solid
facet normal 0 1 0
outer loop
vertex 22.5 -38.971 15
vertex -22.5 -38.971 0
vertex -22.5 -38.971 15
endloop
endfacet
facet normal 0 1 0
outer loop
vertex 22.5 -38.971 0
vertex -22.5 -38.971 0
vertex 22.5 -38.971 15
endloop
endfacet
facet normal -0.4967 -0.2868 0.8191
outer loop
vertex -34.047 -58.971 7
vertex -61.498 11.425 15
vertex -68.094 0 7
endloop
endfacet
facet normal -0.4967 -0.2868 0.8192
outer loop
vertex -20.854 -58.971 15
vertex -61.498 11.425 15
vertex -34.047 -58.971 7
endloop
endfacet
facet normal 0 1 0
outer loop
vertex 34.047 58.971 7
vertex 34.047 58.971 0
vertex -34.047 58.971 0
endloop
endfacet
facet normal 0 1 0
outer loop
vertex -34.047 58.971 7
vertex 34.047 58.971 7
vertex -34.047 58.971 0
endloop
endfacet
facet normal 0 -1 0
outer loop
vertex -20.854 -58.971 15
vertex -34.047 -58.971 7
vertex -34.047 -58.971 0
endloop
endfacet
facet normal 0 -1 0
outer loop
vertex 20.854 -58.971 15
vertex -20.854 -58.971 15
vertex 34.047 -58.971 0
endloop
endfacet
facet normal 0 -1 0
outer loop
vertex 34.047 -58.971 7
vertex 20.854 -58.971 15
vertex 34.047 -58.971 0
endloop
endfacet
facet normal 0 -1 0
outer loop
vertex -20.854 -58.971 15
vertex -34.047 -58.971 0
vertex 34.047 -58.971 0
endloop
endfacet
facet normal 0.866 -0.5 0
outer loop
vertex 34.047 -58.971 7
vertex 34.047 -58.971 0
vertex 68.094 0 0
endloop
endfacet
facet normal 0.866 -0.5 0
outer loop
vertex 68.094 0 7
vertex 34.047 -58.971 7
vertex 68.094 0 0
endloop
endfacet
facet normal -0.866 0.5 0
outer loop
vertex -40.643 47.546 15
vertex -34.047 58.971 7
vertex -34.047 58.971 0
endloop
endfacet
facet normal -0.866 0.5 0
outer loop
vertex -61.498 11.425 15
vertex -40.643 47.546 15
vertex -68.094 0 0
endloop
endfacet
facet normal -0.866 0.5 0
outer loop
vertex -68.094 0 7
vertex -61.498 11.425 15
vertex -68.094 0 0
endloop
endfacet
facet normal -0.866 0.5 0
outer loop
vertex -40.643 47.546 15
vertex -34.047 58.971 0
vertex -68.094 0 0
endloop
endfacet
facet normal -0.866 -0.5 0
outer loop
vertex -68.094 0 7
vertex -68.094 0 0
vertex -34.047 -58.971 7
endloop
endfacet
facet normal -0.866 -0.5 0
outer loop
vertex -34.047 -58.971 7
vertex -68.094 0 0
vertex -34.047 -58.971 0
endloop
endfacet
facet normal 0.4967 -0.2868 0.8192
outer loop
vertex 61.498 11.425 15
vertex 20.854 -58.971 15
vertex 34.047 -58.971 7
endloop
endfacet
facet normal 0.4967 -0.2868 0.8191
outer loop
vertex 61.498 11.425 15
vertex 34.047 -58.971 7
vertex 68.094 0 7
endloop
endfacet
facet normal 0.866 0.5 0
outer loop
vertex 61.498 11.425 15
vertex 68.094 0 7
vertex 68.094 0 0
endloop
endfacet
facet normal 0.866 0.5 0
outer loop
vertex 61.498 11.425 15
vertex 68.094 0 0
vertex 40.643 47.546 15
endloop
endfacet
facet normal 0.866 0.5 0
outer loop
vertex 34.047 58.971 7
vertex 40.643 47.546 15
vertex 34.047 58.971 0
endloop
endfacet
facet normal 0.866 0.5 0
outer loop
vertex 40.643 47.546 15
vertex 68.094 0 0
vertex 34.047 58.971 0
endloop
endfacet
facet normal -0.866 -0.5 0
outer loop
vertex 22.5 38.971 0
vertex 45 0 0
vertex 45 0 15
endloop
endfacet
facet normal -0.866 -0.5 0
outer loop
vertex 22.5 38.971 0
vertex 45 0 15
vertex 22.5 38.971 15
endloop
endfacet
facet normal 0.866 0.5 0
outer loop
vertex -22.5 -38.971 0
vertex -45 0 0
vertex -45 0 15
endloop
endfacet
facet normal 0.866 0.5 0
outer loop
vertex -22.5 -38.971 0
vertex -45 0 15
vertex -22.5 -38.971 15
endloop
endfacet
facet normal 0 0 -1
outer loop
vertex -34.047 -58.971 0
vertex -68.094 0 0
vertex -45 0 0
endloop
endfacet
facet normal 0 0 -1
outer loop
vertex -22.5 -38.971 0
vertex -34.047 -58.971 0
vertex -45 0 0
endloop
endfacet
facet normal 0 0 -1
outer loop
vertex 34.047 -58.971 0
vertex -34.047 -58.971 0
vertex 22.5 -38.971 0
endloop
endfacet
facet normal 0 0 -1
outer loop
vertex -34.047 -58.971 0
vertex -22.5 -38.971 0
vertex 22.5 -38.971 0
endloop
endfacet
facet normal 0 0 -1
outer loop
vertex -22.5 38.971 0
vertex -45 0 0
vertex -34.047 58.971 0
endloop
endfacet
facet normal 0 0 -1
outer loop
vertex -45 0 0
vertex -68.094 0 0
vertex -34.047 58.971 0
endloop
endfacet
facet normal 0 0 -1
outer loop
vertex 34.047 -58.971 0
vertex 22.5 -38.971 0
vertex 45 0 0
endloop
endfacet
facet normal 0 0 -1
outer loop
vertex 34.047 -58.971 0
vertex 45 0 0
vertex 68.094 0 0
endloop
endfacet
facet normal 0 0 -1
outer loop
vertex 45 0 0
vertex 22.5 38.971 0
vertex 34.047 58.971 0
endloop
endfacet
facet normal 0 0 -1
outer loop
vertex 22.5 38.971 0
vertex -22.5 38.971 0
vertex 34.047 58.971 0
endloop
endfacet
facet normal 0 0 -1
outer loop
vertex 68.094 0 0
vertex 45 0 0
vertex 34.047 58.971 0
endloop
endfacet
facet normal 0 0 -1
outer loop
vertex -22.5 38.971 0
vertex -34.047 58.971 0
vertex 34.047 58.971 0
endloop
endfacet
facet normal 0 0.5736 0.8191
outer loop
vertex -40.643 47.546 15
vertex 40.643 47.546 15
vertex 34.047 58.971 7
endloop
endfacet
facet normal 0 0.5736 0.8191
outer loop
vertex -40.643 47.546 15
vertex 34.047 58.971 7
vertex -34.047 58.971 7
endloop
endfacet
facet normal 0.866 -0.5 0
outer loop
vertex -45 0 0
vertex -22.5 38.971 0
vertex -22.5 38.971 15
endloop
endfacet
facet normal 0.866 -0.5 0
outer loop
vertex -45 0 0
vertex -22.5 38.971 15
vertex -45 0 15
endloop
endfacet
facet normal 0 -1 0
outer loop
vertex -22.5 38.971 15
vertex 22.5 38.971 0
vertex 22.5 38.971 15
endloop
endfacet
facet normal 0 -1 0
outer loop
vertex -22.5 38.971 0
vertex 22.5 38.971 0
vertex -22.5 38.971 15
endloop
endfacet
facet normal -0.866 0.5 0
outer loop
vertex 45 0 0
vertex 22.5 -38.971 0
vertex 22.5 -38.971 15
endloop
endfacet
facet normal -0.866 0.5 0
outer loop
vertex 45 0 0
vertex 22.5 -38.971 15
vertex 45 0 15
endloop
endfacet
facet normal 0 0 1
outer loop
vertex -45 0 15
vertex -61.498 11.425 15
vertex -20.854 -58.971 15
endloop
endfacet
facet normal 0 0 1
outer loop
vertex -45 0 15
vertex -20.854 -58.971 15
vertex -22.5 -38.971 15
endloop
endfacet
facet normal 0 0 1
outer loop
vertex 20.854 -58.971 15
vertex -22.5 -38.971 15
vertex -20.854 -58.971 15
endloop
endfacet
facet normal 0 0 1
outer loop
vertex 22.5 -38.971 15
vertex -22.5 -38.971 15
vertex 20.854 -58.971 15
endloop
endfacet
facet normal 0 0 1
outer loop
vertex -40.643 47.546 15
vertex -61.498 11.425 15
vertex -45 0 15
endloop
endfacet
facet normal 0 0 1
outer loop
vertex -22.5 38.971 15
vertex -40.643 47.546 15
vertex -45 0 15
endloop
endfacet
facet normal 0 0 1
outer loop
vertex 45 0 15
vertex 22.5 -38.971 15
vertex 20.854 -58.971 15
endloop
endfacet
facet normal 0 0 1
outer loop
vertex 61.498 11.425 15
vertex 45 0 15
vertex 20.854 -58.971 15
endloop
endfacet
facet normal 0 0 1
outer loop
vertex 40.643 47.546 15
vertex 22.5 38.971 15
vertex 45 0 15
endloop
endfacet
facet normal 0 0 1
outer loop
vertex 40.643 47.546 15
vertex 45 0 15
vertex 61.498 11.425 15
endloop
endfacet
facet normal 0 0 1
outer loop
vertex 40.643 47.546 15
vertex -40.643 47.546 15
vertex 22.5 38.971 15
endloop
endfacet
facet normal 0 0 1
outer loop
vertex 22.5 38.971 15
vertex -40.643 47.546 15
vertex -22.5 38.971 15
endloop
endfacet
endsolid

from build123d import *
from OCP.BRepFilletAPI import BRepFilletAPI_MakeChamfer

# Parameters (mm, degrees)
BOSS_EXTRUDE1_DEPTH = 15
CHAMFER1_SIZE       = 8
CHAMFER1_SIZE2      = 11.425184054


with BuildPart() as part:
    # Sketch1 → Boss-Extrude1 (new body)
    with BuildSketch(Plane.XY):
        Polygon((34.047005384, 58.97114317), (-34.047005384, 58.97114317), (-68.094010768, 0), (-34.047005384, -58.97114317), (34.047005384, -58.97114317), (68.094010768, 0), align=None)
        Polygon((45, 0), (22.5, 38.97114317), (-22.5, 38.97114317), (-45, 0), (-22.5, -38.97114317), (22.5, -38.97114317), align=None, mode=Mode.SUBTRACT)
    extrude(amount=BOSS_EXTRUDE1_DEPTH)

    # Chamfer1: one chamfer whose edges measure the first distance from different faces: ONE call of the kernel's chamfer builder (chamfer() names one face for all edges)
    chamfer1_edges_1 = [part.edges().sort_by_distance(p)[0] for p in [
        (-51.070508076, -29.485571585, 15),
    ]]
    chamfer1_side_1 = [part.faces().sort_by_distance(p)[0] for p in [
        (-51.070508076, -29.485571585, 7.5),
    ]]
    chamfer1_edges_2 = [part.edges().sort_by_distance(p)[0] for p in [
        (51.070508076, -29.485571585, 15),
    ]]
    chamfer1_side_2 = [part.faces().sort_by_distance(p)[0] for p in [
        (51.070508076, -29.485571585, 7.5),
    ]]
    chamfer1_edges_3 = [part.edges().sort_by_distance(p)[0] for p in [
        (0, 58.97114317, 15),
    ]]
    chamfer1_side_3 = [part.faces().sort_by_distance(p)[0] for p in [
        (0, 58.97114317, 7.5),
    ]]
    chamfer1 = BRepFilletAPI_MakeChamfer(part.part.solid().wrapped)
    for e in chamfer1_edges_1:
        chamfer1.Add(CHAMFER1_SIZE, CHAMFER1_SIZE2, e.wrapped, chamfer1_side_1[0].wrapped)  # the first distance lies on this face
    for e in chamfer1_edges_2:
        chamfer1.Add(CHAMFER1_SIZE, CHAMFER1_SIZE2, e.wrapped, chamfer1_side_2[0].wrapped)  # the first distance lies on this face
    for e in chamfer1_edges_3:
        chamfer1.Add(CHAMFER1_SIZE, CHAMFER1_SIZE2, e.wrapped, chamfer1_side_3[0].wrapped)  # the first distance lies on this face
    add(Compound.cast(chamfer1.Shape()), mode=Mode.REPLACE)


solid = part.part
